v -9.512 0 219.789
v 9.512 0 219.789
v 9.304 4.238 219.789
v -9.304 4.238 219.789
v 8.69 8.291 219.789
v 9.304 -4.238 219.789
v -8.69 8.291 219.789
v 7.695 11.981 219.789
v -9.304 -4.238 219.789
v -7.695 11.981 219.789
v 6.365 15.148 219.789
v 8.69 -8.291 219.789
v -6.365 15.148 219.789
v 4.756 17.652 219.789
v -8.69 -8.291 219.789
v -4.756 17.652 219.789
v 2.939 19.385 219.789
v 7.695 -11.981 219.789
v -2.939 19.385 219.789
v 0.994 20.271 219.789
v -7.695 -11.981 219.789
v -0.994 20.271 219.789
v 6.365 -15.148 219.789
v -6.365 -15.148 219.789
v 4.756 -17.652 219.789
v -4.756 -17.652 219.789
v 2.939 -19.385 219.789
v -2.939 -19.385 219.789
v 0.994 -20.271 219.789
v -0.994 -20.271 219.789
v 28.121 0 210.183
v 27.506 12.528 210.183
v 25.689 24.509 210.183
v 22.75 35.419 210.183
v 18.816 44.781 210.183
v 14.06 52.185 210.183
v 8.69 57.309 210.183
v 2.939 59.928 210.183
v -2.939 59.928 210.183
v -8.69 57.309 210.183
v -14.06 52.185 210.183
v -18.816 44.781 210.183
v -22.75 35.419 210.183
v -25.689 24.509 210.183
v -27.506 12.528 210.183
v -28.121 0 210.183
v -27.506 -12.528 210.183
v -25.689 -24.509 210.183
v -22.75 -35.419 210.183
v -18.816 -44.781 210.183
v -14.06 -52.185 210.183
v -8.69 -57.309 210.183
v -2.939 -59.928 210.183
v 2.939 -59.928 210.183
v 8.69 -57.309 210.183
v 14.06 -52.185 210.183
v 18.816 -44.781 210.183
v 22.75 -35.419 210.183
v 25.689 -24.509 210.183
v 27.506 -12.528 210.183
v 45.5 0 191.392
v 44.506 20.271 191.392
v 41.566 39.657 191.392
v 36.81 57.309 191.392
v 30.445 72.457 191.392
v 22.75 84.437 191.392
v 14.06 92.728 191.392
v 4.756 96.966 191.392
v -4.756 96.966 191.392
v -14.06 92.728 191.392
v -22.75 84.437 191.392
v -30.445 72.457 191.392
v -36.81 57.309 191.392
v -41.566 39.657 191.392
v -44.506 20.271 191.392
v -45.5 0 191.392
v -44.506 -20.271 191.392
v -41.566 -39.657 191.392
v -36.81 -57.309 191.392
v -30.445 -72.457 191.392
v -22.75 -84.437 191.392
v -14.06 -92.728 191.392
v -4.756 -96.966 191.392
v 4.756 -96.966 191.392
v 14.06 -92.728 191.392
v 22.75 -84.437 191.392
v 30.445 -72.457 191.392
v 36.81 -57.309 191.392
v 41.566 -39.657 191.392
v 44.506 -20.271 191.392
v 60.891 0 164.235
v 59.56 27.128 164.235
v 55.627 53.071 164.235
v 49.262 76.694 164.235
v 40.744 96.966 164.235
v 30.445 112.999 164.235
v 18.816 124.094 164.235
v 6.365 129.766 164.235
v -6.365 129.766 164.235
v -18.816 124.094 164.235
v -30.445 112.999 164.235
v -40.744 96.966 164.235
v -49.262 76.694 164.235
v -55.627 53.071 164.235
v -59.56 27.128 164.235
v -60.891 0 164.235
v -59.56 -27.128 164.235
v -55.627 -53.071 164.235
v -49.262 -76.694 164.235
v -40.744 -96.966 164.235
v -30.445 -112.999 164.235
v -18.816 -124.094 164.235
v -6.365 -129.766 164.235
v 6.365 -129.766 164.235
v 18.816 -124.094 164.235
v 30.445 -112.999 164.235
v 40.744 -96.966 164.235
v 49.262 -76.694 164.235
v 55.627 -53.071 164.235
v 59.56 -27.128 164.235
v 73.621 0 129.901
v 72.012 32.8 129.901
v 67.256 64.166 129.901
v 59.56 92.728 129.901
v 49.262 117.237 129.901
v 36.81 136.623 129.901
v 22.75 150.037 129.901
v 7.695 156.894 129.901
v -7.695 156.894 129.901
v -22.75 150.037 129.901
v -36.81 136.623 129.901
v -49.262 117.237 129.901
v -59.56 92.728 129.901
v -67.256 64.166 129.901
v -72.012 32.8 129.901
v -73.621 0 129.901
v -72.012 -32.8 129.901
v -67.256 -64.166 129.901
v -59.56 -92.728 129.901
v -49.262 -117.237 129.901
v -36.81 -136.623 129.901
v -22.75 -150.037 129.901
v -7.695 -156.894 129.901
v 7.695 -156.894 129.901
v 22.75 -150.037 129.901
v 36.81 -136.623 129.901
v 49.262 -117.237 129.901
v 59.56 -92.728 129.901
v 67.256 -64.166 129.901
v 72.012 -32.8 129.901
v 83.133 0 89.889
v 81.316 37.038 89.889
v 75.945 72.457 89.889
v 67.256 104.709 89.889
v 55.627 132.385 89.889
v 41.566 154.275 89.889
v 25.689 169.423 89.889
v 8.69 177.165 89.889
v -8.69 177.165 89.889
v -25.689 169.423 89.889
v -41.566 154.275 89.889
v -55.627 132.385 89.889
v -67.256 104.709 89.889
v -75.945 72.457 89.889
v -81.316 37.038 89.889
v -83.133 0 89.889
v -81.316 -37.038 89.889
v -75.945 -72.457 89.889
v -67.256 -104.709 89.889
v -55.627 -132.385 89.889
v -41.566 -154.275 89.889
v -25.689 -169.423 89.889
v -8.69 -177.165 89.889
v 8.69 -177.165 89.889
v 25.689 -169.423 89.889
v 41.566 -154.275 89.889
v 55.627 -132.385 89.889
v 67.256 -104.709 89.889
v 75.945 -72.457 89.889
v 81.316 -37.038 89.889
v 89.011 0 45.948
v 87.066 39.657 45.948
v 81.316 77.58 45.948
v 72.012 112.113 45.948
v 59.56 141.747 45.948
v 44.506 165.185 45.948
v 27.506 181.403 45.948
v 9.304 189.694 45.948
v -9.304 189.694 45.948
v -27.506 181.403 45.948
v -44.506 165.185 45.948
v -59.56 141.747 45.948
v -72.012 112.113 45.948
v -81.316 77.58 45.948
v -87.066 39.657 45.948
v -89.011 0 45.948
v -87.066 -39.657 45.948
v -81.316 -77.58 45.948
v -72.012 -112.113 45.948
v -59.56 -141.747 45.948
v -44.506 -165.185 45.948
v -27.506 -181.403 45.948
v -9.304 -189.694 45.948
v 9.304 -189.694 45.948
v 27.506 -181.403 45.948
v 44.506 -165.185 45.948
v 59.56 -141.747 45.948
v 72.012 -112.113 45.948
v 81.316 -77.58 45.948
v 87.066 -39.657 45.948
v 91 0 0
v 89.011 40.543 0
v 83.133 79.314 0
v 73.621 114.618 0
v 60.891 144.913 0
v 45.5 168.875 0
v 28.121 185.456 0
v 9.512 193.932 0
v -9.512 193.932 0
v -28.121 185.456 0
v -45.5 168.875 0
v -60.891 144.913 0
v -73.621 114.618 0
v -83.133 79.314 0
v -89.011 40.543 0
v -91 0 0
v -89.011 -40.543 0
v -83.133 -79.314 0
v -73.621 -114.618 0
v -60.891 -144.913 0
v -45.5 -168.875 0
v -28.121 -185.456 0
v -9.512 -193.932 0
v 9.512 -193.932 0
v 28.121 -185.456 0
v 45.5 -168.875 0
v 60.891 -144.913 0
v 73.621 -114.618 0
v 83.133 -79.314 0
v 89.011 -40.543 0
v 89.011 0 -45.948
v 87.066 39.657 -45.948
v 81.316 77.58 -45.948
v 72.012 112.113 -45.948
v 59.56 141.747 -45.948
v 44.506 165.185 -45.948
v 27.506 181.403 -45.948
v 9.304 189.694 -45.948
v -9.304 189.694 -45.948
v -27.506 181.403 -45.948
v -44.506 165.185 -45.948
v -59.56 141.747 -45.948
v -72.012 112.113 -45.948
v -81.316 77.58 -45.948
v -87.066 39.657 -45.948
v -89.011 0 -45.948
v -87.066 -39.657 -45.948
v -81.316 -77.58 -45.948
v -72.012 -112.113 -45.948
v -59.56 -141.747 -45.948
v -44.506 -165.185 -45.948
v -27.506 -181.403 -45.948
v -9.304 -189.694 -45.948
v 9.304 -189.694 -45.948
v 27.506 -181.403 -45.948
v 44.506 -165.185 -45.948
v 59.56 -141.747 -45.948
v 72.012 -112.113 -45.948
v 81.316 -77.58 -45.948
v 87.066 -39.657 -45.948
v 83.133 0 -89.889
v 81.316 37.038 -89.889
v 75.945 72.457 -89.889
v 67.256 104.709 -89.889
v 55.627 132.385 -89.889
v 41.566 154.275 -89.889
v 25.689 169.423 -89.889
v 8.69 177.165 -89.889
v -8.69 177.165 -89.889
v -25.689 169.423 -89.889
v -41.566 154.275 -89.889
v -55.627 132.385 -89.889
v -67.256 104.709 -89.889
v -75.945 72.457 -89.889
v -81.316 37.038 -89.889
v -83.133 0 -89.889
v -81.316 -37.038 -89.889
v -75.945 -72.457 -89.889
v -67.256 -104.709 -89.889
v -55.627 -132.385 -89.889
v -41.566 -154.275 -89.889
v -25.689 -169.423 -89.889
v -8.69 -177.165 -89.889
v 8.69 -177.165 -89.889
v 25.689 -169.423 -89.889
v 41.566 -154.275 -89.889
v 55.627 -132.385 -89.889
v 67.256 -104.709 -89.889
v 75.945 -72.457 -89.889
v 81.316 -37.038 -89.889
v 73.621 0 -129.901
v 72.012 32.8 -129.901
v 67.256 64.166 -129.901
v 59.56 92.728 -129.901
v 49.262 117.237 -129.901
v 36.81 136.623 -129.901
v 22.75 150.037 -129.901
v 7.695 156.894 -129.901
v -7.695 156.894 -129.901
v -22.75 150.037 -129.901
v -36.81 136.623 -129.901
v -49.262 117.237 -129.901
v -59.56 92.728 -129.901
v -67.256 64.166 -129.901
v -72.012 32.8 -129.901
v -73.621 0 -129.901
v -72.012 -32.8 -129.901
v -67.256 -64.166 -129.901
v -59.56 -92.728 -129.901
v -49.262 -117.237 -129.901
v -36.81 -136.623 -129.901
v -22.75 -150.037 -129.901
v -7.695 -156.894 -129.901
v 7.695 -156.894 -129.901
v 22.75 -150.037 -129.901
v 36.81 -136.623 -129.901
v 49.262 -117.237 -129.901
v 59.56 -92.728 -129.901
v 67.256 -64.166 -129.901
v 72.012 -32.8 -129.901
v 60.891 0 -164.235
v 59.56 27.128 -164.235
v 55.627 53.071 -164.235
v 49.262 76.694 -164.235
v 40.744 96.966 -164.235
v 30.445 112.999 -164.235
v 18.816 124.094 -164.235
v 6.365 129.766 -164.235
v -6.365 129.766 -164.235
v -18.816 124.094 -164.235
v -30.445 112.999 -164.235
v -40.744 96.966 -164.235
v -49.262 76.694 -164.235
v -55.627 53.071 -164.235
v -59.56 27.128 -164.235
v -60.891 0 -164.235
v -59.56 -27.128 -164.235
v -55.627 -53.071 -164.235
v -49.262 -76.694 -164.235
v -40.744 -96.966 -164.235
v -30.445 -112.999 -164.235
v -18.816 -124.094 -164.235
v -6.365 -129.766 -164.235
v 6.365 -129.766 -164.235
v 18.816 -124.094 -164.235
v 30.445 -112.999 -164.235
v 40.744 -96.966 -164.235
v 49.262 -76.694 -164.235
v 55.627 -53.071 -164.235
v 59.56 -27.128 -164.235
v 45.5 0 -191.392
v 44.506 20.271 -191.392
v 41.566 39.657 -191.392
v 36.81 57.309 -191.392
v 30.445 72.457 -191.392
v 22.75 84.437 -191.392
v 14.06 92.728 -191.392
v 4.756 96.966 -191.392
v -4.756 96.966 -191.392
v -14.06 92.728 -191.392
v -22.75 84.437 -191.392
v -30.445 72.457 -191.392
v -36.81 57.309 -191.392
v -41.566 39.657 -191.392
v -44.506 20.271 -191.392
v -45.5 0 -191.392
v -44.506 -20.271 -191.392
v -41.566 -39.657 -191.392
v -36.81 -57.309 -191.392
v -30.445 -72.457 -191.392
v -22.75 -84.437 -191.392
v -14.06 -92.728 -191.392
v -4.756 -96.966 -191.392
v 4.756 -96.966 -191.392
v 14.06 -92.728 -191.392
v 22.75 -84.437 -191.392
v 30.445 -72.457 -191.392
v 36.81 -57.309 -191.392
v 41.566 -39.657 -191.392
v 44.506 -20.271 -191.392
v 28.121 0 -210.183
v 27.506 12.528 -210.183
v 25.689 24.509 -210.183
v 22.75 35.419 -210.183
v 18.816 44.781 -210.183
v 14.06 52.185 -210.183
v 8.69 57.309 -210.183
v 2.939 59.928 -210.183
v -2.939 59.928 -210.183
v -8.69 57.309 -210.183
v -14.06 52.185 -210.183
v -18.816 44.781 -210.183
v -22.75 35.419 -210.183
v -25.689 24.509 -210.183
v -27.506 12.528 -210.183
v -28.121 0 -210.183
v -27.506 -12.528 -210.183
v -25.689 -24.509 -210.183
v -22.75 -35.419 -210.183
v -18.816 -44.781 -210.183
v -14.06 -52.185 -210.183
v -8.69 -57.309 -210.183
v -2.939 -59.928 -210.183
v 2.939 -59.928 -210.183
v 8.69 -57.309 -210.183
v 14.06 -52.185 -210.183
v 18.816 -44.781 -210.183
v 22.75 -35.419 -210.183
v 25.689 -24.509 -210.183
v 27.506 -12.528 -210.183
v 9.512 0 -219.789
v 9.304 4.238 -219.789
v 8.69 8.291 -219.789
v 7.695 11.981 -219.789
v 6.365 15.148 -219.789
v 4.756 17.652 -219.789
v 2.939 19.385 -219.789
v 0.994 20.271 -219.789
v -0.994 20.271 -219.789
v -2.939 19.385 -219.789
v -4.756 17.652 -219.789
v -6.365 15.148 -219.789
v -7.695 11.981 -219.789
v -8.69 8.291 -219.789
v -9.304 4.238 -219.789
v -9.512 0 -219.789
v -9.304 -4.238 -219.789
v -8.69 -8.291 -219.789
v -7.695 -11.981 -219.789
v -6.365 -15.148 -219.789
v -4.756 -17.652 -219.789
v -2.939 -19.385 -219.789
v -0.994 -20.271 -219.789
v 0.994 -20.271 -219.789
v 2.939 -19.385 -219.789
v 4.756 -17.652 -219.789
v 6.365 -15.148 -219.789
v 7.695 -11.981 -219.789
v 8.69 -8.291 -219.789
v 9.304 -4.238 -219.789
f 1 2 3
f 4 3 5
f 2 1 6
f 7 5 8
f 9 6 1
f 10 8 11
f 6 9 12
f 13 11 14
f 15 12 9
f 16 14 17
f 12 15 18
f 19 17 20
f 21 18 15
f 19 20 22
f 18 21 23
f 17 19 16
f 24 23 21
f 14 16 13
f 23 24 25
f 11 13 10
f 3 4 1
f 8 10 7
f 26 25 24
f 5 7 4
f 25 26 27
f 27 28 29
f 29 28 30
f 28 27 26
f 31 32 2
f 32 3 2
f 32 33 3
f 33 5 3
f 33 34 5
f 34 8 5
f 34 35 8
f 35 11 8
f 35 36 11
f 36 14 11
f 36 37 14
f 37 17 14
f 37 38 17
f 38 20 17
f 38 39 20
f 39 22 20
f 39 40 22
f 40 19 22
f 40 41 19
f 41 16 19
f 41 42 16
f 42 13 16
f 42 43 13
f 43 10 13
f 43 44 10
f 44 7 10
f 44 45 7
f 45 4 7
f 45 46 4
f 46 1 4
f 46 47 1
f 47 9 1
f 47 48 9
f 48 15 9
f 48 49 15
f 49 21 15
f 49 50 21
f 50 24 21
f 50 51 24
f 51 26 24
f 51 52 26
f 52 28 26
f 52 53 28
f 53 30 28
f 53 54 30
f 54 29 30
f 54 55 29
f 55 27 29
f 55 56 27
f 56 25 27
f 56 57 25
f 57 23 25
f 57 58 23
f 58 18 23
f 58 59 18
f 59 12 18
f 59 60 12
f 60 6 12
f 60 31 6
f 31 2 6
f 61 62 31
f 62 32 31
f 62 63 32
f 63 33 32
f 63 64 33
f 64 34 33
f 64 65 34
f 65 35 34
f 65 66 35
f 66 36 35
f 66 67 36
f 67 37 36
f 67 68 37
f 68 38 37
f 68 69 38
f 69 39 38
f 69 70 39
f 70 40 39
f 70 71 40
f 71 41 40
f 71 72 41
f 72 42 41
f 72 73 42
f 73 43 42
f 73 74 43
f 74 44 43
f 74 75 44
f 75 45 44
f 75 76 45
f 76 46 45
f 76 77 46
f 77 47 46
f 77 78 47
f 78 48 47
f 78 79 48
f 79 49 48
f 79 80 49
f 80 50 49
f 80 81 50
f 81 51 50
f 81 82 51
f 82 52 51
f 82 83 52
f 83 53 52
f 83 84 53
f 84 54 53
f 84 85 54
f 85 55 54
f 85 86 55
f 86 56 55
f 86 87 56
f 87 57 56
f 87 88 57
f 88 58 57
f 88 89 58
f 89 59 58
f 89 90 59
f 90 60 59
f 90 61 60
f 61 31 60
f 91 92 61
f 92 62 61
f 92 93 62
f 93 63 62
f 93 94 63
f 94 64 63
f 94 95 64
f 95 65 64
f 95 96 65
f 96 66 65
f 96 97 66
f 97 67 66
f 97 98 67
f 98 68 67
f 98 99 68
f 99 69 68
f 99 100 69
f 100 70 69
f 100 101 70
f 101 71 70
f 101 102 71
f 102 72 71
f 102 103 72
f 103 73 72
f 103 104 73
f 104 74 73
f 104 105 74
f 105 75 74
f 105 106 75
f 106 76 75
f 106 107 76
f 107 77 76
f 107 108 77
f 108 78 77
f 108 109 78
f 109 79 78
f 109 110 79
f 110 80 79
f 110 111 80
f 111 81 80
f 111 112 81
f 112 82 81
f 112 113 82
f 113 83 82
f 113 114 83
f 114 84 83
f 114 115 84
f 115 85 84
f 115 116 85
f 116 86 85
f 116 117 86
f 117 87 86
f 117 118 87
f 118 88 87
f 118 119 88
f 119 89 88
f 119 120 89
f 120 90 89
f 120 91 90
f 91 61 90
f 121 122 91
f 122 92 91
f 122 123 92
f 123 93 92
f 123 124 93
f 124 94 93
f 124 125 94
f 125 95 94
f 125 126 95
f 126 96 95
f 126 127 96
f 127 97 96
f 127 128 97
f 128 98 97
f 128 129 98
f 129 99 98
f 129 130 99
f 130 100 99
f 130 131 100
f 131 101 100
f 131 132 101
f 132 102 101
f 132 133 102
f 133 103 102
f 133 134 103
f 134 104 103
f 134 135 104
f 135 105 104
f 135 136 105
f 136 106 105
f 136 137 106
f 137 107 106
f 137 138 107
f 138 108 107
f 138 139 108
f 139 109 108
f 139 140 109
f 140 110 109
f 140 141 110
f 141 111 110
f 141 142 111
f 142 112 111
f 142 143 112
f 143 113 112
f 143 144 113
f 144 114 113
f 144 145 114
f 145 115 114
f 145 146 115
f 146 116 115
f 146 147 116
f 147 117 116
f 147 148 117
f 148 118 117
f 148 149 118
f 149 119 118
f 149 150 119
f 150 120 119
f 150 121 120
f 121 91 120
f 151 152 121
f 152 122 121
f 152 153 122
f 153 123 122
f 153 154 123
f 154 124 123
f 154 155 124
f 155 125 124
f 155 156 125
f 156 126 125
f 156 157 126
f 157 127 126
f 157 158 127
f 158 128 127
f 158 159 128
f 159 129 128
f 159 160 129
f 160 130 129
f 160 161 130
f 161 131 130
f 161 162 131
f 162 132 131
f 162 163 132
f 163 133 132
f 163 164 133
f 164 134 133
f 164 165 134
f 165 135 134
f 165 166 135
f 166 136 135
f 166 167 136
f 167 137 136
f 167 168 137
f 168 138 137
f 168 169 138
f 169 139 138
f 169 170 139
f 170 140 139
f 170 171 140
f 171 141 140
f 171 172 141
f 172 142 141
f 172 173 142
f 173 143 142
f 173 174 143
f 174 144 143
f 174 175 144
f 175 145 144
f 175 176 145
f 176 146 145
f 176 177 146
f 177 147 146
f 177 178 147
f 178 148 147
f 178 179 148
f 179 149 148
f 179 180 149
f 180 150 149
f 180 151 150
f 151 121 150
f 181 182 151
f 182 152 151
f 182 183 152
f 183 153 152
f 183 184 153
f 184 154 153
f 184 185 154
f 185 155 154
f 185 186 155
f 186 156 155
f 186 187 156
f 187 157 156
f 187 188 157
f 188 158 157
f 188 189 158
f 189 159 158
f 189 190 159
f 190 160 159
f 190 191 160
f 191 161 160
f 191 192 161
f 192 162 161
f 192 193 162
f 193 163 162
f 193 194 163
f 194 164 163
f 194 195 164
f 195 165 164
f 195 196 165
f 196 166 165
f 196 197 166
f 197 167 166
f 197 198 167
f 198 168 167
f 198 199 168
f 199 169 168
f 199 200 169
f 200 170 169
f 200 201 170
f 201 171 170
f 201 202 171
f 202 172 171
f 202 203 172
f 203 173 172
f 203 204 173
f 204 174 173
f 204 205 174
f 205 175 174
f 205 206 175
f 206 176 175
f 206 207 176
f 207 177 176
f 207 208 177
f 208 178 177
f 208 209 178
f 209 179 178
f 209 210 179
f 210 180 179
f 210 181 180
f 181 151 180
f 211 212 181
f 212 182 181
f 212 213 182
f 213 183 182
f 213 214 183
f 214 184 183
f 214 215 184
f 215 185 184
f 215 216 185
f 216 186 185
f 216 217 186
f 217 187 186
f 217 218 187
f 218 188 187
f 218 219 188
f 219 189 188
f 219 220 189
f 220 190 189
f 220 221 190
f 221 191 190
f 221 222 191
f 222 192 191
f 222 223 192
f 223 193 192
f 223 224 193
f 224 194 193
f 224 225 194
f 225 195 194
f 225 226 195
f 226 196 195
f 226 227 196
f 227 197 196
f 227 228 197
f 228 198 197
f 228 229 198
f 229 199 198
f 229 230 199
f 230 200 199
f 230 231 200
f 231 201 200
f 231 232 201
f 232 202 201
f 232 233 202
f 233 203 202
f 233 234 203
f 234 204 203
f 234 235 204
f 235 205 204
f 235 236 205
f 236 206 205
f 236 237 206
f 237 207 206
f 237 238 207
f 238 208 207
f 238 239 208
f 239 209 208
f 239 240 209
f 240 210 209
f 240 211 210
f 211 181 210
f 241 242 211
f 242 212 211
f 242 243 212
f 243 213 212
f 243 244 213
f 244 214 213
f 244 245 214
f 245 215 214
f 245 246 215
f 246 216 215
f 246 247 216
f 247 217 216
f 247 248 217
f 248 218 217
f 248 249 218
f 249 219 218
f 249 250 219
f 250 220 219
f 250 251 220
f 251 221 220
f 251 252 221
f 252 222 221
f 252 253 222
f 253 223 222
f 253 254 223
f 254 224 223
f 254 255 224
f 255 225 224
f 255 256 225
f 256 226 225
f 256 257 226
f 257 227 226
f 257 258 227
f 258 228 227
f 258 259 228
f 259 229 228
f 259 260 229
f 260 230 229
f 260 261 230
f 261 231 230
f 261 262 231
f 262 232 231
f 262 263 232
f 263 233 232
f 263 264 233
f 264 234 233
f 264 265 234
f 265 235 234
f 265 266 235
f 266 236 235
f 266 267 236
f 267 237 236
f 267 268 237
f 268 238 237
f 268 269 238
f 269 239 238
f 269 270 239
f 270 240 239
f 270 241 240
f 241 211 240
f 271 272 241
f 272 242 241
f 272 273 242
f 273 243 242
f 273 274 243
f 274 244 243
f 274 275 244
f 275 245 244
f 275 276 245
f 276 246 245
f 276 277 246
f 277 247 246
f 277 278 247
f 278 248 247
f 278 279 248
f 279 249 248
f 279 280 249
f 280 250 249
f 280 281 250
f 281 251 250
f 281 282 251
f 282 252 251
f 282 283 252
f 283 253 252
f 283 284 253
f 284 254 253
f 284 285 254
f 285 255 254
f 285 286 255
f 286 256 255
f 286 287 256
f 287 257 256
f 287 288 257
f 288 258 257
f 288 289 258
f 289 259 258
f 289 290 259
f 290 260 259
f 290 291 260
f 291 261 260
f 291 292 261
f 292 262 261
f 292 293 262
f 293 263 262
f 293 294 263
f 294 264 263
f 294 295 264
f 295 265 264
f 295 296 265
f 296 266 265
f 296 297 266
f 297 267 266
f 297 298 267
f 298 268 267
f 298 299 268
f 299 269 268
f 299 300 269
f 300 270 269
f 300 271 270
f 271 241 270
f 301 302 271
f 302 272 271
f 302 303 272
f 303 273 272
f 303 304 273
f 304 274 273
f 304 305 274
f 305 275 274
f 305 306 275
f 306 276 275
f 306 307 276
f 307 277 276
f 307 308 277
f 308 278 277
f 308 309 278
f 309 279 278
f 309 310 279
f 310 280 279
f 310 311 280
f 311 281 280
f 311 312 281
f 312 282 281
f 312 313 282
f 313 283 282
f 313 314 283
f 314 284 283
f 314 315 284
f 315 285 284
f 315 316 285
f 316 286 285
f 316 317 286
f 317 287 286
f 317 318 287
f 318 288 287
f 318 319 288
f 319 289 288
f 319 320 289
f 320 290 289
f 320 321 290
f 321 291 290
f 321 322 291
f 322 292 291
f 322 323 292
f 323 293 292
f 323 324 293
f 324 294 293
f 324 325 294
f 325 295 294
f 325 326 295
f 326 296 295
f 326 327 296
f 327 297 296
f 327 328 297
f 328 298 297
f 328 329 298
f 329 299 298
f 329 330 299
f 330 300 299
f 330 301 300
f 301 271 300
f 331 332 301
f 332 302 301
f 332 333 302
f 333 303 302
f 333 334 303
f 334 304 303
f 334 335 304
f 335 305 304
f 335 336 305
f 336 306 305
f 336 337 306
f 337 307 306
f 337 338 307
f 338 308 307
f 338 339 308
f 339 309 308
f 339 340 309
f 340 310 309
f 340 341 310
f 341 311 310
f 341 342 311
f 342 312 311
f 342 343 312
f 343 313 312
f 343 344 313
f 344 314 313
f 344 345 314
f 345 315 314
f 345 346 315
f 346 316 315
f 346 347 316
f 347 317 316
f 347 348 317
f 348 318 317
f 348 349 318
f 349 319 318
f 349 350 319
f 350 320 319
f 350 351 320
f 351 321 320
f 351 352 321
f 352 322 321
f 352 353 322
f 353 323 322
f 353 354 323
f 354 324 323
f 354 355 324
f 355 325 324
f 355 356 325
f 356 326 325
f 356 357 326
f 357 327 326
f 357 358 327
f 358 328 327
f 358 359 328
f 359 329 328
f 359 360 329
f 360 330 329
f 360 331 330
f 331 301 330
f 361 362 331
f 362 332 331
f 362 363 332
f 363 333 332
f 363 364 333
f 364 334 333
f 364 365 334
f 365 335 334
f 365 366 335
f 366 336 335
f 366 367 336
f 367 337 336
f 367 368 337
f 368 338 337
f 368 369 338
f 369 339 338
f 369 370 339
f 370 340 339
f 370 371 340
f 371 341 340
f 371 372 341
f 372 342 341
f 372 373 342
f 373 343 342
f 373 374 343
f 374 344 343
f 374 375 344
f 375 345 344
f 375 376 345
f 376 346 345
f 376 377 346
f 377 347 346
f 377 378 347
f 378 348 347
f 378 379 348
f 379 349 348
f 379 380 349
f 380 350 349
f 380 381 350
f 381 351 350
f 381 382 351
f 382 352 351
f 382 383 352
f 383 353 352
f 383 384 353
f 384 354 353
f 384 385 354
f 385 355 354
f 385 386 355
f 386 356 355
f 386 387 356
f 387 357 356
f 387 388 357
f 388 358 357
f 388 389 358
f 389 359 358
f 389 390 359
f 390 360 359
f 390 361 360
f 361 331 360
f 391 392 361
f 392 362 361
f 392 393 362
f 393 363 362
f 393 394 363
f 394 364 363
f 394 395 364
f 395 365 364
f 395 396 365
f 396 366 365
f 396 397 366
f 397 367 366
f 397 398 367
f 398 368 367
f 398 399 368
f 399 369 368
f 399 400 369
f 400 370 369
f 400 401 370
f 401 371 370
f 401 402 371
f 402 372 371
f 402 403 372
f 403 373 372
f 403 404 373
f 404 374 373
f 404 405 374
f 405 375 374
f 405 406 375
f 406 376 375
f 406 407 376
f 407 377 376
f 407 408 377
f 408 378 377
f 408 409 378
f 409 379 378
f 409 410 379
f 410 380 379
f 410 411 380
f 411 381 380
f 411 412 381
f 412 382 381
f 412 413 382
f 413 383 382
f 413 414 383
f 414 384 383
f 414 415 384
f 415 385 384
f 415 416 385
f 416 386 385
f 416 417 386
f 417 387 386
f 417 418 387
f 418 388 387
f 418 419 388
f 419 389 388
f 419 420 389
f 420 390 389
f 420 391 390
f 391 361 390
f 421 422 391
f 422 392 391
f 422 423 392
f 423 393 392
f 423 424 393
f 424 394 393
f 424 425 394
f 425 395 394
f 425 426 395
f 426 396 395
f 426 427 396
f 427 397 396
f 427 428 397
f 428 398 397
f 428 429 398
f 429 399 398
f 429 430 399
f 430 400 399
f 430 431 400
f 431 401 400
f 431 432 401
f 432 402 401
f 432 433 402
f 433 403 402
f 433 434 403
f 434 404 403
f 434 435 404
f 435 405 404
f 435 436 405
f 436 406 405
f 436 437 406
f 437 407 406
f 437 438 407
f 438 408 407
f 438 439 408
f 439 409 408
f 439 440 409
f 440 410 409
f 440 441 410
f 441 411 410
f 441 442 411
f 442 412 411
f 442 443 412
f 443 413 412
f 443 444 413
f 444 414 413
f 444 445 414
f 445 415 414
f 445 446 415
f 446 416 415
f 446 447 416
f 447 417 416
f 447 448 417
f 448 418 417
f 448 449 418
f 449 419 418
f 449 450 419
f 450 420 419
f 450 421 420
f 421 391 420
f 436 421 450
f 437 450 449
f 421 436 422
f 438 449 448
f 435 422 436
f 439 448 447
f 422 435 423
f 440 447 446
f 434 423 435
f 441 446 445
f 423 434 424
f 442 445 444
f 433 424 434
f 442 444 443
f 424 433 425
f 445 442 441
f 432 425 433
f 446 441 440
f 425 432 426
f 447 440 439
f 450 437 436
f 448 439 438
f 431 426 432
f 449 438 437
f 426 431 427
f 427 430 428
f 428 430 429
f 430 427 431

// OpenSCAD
// Generated by SolidPython 1.0.1 on 2020-07-29 00:46:48


scale(v = [7, 15, 17]) {
	sphere(r = 13);
}
/***********************************************
*********      SolidPython code:      **********
************************************************
 
# import packages: SolidPython
from solid import *
from solid.utils import *
from itertools import chain, combinations, permutations


class Resize:

    def __init__(self, scad_file):
        self.scad_file = scad_file
        #self.scad_file = import_scad(scad_file)
        # cone/cylinder param:
        self.r1 = 0
        self.r2 = 0
        self.h = 0
        # rectangular prism param:
        self.w = 0
        self.l = 0
        # ellipse param:
        self.r = 0

    # import OpenScad code (file name corresponds to shape)


    # classify shape + parameters
    def assign(self, param1, param2, param3):
        if self.scad_file == 'cone.scad':
            self.r1 = param1
            self.r2 = param2
            self.h = param3
        elif self.scad_file == 'cylinder.scad':
            self.r1 = param1
            self.r2 = param2
            self.h = param3
        elif self.scad_file == 'rectangularPrism.scad':
            self.h = param1
            self.l = param2
            self.w = param3
        else:
            self.r = param1
            self.h = param2

    # resize parameters
    def iterate(self):
        x = range(3, 20, 2)
        i = 1
        if self.scad_file == 'cone.scad':
            tempList = list(permutations(x, 2))
            for temp in tempList:
                param1 = temp[0]
                param2 = temp[1]
                filepath = 'produced_scad_files/' + 'cone' + str(param1) + '_' + str(param2) + '_' + '.scad'
                scad_render_to_file(cylinder(h=param1, r1=param2, r2=0), filepath)

        elif self.scad_file == 'cylinder.scad':
            tempList = list(permutations(x, 3))
            for temp in tempList:
                param1 = temp[0]
                param2 = temp[1]
                filepath = 'produced_scad_files/' + 'cylinder' + str(param1) + '_' + str(param2) + '_' + '.scad'
                scad_render_to_file(cylinder(h=param1, r1=param2, r2=param2), filepath)

        elif self.scad_file == 'rectangularPrism.scad':
            tempList = list(permutations(x, 3))
            for temp in tempList:
                param1 = temp[0]
                param2 = temp[1]
                param3 = temp[2]
                filepath = 'produced_scad_files/' + 'rectangularPrism' + str(param1) + '_' + str(param2) + '_' + str(
                    param3) + '.scad'
                scad_render_to_file(cube(size=(param1, param2, param3)), filepath)

        elif self.scad_file == 'ellipse.scad':
            tempList = list(permutations(x, 4))
            for temp in tempList:
                param1 = temp[0]
                param2 = temp[1]
                param3 = temp[2]
                param4 = temp[3]
                filepath = 'produced_scad_files/' + 'ellipse' + str(param1) + '_' + str(param2) + '_' + str(param3) + '_' + str(param4) + '.scad'
                scad_render_to_file(scale([param1, param2, param3])(sphere(r=param4)), filepath)

    def render_to_scadfile(self):
        scad_render_to_file(scad, 'example.scad') 
 
************************************************/
